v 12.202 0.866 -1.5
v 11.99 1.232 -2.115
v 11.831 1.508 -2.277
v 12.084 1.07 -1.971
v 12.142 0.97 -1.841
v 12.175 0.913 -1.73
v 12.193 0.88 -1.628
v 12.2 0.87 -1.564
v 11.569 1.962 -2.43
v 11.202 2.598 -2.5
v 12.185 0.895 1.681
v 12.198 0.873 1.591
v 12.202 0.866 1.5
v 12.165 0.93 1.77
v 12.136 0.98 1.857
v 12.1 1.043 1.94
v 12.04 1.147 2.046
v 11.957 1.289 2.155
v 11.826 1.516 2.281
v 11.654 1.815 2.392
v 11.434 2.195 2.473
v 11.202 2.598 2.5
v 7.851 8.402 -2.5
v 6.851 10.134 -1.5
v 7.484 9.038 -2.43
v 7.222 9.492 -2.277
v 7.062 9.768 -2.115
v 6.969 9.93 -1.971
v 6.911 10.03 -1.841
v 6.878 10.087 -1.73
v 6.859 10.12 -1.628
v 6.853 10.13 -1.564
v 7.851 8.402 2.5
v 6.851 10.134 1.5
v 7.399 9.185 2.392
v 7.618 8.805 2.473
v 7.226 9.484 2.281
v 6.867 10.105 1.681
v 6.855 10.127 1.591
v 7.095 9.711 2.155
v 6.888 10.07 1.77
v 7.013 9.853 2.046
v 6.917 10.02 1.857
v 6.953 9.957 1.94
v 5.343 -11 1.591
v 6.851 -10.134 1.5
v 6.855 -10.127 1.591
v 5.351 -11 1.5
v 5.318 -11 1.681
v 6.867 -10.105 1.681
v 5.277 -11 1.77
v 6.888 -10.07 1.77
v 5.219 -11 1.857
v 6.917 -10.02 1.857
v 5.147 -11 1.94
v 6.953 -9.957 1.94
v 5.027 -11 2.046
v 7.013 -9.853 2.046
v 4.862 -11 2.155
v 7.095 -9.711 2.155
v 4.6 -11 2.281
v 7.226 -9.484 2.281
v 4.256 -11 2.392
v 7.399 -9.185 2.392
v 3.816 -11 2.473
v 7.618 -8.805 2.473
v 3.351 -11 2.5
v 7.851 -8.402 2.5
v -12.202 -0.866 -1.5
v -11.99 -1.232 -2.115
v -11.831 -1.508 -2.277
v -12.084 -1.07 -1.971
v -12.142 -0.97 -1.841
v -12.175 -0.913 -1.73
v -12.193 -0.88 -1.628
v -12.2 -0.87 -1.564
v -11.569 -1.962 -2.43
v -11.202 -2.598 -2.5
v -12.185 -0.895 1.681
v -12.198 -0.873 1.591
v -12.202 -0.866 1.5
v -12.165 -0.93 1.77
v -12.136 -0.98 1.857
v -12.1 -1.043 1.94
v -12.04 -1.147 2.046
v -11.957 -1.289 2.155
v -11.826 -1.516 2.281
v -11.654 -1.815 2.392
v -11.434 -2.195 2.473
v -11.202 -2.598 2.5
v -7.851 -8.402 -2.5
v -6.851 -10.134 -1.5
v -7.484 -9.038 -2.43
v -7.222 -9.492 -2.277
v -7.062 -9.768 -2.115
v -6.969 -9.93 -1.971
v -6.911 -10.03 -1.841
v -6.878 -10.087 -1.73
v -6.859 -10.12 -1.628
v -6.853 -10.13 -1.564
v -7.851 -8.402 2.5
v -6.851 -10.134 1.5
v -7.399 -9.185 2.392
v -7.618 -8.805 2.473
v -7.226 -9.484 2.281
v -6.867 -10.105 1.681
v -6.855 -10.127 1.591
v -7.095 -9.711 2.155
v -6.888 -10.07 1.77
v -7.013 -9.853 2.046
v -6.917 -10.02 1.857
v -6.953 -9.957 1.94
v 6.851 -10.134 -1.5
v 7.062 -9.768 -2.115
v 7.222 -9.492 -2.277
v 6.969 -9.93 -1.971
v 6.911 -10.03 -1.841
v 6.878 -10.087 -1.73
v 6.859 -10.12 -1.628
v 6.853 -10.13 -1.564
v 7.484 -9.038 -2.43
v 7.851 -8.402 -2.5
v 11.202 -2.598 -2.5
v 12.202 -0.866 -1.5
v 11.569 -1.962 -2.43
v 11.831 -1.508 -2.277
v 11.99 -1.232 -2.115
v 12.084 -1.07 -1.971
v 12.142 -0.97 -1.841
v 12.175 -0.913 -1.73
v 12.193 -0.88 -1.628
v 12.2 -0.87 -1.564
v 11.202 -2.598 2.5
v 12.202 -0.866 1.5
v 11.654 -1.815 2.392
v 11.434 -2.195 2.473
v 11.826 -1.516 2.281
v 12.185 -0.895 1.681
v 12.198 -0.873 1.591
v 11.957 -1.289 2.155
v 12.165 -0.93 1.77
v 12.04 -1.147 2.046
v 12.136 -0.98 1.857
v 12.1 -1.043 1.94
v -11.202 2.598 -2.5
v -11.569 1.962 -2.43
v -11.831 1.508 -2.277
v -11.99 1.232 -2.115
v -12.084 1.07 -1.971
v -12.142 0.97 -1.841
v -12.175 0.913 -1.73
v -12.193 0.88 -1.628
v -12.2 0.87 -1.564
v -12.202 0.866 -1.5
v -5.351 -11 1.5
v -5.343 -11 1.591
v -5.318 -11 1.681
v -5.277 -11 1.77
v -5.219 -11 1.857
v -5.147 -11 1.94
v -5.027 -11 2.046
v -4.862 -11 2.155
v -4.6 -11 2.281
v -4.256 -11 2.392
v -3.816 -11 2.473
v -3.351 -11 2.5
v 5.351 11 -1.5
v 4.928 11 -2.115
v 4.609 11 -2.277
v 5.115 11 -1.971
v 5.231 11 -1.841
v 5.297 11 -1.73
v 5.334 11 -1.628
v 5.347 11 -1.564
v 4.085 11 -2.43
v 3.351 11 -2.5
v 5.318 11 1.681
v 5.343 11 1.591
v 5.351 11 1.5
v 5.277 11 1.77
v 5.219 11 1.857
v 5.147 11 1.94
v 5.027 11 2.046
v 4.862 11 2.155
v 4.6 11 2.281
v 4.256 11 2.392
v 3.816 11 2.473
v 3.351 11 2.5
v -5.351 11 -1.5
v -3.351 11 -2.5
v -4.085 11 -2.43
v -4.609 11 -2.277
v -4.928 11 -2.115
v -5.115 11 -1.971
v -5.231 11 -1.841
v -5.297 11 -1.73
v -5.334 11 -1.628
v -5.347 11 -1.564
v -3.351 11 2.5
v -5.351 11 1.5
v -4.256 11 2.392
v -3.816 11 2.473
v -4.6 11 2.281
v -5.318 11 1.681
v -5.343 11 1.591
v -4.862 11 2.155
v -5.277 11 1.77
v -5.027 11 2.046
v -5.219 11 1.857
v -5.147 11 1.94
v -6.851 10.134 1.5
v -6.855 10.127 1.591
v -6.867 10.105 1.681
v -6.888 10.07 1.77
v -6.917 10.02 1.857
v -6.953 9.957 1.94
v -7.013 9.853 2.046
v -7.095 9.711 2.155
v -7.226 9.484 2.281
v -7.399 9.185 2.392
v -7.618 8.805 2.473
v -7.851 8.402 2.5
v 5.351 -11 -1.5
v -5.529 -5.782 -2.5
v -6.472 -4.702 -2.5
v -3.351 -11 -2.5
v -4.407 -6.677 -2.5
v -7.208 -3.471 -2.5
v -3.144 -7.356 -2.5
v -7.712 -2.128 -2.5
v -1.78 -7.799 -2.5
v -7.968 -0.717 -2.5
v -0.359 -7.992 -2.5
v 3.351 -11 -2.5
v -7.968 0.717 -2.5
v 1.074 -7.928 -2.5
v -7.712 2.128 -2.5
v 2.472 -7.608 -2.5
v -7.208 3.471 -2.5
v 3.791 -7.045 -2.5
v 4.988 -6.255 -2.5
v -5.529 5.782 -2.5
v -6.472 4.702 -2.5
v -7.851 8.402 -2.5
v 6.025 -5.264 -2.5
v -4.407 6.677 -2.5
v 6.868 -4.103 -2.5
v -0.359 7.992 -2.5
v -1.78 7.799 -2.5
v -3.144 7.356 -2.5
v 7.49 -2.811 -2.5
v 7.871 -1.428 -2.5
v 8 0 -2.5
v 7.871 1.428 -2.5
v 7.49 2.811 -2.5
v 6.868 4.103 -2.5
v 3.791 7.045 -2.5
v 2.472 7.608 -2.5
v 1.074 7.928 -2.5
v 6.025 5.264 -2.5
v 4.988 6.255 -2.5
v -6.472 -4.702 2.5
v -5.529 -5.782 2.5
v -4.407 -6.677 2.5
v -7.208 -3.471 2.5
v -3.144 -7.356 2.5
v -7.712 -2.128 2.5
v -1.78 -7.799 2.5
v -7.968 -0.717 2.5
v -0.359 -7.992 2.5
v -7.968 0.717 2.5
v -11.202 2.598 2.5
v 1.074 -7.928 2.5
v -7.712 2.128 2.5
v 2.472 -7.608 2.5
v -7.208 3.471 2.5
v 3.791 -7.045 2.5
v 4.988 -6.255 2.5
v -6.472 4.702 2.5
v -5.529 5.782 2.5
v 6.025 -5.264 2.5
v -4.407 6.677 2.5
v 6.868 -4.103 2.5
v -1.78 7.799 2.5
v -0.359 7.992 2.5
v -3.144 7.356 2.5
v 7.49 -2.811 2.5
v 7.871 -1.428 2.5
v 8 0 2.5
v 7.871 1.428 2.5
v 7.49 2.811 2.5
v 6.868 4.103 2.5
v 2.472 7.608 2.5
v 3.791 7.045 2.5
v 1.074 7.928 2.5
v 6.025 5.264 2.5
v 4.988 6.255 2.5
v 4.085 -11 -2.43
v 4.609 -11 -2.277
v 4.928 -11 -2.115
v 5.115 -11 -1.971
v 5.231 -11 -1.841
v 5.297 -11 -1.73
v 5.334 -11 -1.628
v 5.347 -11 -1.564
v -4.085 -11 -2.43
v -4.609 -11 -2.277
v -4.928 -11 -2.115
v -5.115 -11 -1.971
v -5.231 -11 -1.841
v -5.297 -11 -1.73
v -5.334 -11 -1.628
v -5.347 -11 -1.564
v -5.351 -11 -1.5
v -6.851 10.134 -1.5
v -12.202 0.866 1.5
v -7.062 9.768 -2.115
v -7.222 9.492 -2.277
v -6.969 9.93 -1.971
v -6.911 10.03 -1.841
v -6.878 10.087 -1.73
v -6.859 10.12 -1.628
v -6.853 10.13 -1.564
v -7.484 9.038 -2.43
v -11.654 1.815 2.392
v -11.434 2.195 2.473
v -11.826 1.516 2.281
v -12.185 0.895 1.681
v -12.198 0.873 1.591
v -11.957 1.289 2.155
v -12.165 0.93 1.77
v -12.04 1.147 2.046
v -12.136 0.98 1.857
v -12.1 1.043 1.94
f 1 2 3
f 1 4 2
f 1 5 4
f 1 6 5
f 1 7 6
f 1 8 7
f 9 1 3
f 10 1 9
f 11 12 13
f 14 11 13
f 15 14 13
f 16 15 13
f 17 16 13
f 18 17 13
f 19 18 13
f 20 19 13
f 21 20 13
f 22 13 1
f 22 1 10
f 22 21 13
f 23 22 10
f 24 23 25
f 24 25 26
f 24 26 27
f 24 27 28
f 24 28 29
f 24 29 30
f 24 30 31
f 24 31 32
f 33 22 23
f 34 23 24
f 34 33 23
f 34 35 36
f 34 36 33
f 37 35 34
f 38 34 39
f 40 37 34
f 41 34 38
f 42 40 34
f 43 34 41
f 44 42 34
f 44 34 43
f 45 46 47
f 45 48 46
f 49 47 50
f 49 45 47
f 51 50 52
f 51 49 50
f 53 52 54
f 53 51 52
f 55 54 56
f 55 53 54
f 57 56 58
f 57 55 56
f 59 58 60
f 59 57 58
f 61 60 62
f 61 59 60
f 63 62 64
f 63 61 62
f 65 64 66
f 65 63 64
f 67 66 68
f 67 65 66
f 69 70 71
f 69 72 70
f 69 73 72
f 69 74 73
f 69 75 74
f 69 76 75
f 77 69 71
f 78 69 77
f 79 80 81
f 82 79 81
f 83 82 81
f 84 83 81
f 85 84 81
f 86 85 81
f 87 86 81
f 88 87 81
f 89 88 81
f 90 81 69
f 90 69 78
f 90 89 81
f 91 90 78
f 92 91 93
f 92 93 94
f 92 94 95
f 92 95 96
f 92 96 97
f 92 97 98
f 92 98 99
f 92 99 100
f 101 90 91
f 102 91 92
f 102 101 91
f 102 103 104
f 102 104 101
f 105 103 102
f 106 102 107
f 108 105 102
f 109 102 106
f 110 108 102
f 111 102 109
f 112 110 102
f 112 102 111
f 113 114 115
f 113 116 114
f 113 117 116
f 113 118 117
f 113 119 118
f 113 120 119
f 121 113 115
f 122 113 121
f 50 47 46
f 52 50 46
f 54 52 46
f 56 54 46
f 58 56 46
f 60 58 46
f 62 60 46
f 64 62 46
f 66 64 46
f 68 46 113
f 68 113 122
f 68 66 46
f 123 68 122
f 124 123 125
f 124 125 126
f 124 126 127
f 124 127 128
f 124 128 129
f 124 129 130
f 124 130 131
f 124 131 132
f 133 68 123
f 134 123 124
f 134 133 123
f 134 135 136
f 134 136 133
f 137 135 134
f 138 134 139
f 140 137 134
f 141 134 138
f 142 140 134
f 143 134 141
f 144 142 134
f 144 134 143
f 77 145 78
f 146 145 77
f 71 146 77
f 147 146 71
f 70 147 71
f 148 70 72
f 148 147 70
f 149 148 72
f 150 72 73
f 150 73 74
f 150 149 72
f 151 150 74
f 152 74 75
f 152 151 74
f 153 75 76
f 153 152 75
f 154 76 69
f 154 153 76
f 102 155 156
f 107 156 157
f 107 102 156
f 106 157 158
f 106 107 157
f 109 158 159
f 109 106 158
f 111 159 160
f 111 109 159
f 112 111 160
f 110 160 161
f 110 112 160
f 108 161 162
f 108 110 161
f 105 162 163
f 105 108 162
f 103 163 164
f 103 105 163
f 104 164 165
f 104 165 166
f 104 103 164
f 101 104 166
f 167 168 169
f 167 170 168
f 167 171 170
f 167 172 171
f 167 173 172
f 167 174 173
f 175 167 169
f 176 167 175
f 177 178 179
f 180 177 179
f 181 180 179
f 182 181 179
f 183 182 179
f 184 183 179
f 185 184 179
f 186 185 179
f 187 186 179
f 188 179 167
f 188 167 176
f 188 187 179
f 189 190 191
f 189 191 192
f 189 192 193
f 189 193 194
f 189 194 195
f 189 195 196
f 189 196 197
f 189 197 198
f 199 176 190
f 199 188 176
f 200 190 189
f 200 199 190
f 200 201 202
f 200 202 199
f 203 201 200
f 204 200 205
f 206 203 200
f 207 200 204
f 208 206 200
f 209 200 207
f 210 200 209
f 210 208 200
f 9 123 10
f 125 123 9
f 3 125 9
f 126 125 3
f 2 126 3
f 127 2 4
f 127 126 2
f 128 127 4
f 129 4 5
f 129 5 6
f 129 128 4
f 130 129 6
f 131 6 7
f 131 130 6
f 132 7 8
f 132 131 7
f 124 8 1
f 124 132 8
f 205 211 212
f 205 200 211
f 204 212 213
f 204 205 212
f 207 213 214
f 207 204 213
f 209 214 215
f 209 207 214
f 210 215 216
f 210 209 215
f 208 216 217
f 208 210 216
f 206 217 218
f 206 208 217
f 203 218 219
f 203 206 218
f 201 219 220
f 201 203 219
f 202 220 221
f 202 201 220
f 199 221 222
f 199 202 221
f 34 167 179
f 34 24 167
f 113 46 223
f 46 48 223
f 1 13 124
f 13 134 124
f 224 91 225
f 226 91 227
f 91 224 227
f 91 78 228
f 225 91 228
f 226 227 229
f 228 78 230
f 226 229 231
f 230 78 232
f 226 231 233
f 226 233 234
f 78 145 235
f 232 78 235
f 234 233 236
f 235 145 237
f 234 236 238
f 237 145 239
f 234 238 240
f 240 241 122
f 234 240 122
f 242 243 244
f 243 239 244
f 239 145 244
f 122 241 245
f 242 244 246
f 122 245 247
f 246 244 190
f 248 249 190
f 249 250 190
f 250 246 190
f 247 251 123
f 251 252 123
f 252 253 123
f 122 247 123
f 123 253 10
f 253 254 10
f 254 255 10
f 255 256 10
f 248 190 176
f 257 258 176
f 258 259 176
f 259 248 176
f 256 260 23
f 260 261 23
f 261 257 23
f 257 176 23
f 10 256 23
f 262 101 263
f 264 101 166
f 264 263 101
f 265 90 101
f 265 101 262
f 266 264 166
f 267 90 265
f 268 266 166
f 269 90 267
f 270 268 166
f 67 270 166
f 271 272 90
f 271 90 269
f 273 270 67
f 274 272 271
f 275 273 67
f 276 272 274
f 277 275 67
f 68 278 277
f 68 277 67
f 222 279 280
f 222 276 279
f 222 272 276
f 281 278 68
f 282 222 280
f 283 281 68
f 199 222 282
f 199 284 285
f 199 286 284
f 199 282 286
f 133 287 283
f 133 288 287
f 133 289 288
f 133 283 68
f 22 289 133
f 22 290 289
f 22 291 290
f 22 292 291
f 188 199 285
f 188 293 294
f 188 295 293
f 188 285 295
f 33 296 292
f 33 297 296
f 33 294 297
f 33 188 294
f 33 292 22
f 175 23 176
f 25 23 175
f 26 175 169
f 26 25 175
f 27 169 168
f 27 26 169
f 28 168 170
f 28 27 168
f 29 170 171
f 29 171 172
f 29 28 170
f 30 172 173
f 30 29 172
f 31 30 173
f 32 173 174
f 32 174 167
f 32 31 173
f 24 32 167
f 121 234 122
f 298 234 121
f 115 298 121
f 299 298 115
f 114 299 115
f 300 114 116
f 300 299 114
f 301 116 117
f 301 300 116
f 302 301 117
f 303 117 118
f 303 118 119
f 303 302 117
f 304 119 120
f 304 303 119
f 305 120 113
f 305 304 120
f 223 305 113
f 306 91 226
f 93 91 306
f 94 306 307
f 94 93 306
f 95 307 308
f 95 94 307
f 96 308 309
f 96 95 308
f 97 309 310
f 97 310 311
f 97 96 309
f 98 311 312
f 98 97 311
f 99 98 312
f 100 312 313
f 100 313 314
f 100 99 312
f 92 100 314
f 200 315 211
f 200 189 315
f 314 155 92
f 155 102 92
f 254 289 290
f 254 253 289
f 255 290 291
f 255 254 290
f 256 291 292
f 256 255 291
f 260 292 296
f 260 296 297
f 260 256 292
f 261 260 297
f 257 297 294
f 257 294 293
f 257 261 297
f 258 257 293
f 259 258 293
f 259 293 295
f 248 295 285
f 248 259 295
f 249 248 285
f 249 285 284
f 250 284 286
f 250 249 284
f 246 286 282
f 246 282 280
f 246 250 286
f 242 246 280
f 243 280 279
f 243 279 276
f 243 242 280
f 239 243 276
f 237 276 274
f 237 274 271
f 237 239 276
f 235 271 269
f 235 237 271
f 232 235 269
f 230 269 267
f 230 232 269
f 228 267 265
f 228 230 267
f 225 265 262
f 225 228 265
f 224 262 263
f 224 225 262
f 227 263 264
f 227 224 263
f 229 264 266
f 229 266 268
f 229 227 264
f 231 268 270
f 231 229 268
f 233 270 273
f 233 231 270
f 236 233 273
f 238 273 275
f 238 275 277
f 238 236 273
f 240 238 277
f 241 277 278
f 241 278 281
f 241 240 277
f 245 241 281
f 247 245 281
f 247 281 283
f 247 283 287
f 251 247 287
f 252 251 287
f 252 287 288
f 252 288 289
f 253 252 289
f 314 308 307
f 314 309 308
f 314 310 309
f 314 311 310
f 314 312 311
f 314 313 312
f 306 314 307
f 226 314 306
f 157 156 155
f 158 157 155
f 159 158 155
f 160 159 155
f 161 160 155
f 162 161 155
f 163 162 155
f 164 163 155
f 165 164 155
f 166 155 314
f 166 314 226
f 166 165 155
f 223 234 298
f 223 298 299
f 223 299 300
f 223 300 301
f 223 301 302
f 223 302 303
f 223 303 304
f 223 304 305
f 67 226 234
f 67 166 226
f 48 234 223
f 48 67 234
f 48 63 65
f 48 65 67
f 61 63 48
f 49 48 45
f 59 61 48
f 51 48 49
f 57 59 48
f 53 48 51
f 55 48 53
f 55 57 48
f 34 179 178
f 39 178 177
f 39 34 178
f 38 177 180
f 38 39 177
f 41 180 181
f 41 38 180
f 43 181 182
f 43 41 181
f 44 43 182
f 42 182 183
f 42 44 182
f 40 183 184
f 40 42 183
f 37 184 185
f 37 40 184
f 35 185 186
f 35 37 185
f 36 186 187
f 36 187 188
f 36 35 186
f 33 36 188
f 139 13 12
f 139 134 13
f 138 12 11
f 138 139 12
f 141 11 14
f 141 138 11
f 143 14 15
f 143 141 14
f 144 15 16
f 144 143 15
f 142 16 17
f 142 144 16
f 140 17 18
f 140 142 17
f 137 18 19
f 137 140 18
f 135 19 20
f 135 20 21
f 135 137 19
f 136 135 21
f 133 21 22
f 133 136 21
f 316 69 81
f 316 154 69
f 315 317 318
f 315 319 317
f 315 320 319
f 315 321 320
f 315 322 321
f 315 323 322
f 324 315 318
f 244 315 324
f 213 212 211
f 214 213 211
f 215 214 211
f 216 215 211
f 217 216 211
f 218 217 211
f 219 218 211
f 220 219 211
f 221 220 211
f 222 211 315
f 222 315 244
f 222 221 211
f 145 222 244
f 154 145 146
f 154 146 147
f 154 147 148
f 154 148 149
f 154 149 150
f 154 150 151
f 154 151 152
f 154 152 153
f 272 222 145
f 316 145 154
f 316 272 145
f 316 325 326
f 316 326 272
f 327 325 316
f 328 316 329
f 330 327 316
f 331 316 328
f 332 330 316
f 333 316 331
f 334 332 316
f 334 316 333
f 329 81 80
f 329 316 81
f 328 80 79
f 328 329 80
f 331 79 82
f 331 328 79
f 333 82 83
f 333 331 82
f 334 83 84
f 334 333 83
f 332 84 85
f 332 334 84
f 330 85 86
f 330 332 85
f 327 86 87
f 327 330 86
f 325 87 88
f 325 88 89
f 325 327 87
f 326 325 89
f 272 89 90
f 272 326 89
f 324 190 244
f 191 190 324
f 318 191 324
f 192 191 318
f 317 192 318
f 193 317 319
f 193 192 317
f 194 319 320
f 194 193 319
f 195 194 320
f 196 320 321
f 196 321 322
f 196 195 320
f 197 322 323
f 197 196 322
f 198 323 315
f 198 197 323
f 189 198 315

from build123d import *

# Parameters (mm, degrees)
SKETCH1_R            = 8
BOSS_EXTRUDE1_DEPTH  = 2.5
CHAMFER1_SIZE        = 1
CHAMFER1_EDGE_2_SIZE = 1
CHAMFER1_EDGE_3_SIZE = 1
CHAMFER1_EDGE_4_SIZE = 1
CHAMFER1_EDGE_5_SIZE = 1
CHAMFER1_EDGE_6_SIZE = 1
FILLET1_R            = 1


with BuildPart() as part:
    # Sketch1 → Boss-Extrude1 (new, symmetric)
    with BuildSketch(Plane.XY):
        Polygon((12.701705922, 0), (6.350852961, 11), (-6.350852961, 11), (-12.701705922, 0), (-6.350852961, -11), (6.350852961, -11), align=None)
        Circle(SKETCH1_R, mode=Mode.SUBTRACT)
    extrude(amount=BOSS_EXTRUDE1_DEPTH, both=True)

    # Chamfer1
    chamfer1_edges = [part.edges().sort_by_distance(p)[0] for p in [
        (6.350852961, -11, 0),
    ]]
    chamfer(chamfer1_edges, length=CHAMFER1_SIZE)

    # Chamfer1 edge 2
    chamfer1_edge_2_edges = [part.edges().sort_by_distance(p)[0] for p in [
        (-6.350852961, -11, 0),
    ]]
    chamfer(chamfer1_edge_2_edges, length=CHAMFER1_EDGE_2_SIZE)

    # Chamfer1 edge 3
    chamfer1_edge_3_edges = [part.edges().sort_by_distance(p)[0] for p in [
        (-12.701705922, 0, 0),
    ]]
    chamfer(chamfer1_edge_3_edges, length=CHAMFER1_EDGE_3_SIZE)

    # Chamfer1 edge 4
    chamfer1_edge_4_edges = [part.edges().sort_by_distance(p)[0] for p in [
        (-6.350852961, 11, 0),
    ]]
    chamfer(chamfer1_edge_4_edges, length=CHAMFER1_EDGE_4_SIZE)

    # Chamfer1 edge 5
    chamfer1_edge_5_edges = [part.edges().sort_by_distance(p)[0] for p in [
        (6.350852961, 11, 0),
    ]]
    chamfer(chamfer1_edge_5_edges, length=CHAMFER1_EDGE_5_SIZE)

    # Chamfer1 edge 6
    chamfer1_edge_6_edges = [part.edges().sort_by_distance(p)[0] for p in [
        (12.701705922, 0, 0),
    ]]
    chamfer(chamfer1_edge_6_edges, length=CHAMFER1_EDGE_6_SIZE)

    # Fillet1
    fillet1_edges = [part.edges().sort_by_distance(p)[0] for p in [
        (6.100852961, 10.566987298, -2.5),
        (12.201705922, 0, -2.5),
        (6.100852961, -10.566987298, -2.5),
        (-6.100852961, -10.566987298, -2.5),
        (-12.201705922, 0, -2.5),
        (-6.100852961, 10.566987298, -2.5),
        (6.100852961, 10.566987298, 2.5),
        (12.201705922, 0, 2.5),
        (6.100852961, -10.566987298, 2.5),
        (-6.100852961, -10.566987298, 2.5),
        (-12.201705922, 0, 2.5),
        (-6.100852961, 10.566987298, 2.5),
    ]]
    fillet(fillet1_edges, radius=FILLET1_R)


solid = part.part
